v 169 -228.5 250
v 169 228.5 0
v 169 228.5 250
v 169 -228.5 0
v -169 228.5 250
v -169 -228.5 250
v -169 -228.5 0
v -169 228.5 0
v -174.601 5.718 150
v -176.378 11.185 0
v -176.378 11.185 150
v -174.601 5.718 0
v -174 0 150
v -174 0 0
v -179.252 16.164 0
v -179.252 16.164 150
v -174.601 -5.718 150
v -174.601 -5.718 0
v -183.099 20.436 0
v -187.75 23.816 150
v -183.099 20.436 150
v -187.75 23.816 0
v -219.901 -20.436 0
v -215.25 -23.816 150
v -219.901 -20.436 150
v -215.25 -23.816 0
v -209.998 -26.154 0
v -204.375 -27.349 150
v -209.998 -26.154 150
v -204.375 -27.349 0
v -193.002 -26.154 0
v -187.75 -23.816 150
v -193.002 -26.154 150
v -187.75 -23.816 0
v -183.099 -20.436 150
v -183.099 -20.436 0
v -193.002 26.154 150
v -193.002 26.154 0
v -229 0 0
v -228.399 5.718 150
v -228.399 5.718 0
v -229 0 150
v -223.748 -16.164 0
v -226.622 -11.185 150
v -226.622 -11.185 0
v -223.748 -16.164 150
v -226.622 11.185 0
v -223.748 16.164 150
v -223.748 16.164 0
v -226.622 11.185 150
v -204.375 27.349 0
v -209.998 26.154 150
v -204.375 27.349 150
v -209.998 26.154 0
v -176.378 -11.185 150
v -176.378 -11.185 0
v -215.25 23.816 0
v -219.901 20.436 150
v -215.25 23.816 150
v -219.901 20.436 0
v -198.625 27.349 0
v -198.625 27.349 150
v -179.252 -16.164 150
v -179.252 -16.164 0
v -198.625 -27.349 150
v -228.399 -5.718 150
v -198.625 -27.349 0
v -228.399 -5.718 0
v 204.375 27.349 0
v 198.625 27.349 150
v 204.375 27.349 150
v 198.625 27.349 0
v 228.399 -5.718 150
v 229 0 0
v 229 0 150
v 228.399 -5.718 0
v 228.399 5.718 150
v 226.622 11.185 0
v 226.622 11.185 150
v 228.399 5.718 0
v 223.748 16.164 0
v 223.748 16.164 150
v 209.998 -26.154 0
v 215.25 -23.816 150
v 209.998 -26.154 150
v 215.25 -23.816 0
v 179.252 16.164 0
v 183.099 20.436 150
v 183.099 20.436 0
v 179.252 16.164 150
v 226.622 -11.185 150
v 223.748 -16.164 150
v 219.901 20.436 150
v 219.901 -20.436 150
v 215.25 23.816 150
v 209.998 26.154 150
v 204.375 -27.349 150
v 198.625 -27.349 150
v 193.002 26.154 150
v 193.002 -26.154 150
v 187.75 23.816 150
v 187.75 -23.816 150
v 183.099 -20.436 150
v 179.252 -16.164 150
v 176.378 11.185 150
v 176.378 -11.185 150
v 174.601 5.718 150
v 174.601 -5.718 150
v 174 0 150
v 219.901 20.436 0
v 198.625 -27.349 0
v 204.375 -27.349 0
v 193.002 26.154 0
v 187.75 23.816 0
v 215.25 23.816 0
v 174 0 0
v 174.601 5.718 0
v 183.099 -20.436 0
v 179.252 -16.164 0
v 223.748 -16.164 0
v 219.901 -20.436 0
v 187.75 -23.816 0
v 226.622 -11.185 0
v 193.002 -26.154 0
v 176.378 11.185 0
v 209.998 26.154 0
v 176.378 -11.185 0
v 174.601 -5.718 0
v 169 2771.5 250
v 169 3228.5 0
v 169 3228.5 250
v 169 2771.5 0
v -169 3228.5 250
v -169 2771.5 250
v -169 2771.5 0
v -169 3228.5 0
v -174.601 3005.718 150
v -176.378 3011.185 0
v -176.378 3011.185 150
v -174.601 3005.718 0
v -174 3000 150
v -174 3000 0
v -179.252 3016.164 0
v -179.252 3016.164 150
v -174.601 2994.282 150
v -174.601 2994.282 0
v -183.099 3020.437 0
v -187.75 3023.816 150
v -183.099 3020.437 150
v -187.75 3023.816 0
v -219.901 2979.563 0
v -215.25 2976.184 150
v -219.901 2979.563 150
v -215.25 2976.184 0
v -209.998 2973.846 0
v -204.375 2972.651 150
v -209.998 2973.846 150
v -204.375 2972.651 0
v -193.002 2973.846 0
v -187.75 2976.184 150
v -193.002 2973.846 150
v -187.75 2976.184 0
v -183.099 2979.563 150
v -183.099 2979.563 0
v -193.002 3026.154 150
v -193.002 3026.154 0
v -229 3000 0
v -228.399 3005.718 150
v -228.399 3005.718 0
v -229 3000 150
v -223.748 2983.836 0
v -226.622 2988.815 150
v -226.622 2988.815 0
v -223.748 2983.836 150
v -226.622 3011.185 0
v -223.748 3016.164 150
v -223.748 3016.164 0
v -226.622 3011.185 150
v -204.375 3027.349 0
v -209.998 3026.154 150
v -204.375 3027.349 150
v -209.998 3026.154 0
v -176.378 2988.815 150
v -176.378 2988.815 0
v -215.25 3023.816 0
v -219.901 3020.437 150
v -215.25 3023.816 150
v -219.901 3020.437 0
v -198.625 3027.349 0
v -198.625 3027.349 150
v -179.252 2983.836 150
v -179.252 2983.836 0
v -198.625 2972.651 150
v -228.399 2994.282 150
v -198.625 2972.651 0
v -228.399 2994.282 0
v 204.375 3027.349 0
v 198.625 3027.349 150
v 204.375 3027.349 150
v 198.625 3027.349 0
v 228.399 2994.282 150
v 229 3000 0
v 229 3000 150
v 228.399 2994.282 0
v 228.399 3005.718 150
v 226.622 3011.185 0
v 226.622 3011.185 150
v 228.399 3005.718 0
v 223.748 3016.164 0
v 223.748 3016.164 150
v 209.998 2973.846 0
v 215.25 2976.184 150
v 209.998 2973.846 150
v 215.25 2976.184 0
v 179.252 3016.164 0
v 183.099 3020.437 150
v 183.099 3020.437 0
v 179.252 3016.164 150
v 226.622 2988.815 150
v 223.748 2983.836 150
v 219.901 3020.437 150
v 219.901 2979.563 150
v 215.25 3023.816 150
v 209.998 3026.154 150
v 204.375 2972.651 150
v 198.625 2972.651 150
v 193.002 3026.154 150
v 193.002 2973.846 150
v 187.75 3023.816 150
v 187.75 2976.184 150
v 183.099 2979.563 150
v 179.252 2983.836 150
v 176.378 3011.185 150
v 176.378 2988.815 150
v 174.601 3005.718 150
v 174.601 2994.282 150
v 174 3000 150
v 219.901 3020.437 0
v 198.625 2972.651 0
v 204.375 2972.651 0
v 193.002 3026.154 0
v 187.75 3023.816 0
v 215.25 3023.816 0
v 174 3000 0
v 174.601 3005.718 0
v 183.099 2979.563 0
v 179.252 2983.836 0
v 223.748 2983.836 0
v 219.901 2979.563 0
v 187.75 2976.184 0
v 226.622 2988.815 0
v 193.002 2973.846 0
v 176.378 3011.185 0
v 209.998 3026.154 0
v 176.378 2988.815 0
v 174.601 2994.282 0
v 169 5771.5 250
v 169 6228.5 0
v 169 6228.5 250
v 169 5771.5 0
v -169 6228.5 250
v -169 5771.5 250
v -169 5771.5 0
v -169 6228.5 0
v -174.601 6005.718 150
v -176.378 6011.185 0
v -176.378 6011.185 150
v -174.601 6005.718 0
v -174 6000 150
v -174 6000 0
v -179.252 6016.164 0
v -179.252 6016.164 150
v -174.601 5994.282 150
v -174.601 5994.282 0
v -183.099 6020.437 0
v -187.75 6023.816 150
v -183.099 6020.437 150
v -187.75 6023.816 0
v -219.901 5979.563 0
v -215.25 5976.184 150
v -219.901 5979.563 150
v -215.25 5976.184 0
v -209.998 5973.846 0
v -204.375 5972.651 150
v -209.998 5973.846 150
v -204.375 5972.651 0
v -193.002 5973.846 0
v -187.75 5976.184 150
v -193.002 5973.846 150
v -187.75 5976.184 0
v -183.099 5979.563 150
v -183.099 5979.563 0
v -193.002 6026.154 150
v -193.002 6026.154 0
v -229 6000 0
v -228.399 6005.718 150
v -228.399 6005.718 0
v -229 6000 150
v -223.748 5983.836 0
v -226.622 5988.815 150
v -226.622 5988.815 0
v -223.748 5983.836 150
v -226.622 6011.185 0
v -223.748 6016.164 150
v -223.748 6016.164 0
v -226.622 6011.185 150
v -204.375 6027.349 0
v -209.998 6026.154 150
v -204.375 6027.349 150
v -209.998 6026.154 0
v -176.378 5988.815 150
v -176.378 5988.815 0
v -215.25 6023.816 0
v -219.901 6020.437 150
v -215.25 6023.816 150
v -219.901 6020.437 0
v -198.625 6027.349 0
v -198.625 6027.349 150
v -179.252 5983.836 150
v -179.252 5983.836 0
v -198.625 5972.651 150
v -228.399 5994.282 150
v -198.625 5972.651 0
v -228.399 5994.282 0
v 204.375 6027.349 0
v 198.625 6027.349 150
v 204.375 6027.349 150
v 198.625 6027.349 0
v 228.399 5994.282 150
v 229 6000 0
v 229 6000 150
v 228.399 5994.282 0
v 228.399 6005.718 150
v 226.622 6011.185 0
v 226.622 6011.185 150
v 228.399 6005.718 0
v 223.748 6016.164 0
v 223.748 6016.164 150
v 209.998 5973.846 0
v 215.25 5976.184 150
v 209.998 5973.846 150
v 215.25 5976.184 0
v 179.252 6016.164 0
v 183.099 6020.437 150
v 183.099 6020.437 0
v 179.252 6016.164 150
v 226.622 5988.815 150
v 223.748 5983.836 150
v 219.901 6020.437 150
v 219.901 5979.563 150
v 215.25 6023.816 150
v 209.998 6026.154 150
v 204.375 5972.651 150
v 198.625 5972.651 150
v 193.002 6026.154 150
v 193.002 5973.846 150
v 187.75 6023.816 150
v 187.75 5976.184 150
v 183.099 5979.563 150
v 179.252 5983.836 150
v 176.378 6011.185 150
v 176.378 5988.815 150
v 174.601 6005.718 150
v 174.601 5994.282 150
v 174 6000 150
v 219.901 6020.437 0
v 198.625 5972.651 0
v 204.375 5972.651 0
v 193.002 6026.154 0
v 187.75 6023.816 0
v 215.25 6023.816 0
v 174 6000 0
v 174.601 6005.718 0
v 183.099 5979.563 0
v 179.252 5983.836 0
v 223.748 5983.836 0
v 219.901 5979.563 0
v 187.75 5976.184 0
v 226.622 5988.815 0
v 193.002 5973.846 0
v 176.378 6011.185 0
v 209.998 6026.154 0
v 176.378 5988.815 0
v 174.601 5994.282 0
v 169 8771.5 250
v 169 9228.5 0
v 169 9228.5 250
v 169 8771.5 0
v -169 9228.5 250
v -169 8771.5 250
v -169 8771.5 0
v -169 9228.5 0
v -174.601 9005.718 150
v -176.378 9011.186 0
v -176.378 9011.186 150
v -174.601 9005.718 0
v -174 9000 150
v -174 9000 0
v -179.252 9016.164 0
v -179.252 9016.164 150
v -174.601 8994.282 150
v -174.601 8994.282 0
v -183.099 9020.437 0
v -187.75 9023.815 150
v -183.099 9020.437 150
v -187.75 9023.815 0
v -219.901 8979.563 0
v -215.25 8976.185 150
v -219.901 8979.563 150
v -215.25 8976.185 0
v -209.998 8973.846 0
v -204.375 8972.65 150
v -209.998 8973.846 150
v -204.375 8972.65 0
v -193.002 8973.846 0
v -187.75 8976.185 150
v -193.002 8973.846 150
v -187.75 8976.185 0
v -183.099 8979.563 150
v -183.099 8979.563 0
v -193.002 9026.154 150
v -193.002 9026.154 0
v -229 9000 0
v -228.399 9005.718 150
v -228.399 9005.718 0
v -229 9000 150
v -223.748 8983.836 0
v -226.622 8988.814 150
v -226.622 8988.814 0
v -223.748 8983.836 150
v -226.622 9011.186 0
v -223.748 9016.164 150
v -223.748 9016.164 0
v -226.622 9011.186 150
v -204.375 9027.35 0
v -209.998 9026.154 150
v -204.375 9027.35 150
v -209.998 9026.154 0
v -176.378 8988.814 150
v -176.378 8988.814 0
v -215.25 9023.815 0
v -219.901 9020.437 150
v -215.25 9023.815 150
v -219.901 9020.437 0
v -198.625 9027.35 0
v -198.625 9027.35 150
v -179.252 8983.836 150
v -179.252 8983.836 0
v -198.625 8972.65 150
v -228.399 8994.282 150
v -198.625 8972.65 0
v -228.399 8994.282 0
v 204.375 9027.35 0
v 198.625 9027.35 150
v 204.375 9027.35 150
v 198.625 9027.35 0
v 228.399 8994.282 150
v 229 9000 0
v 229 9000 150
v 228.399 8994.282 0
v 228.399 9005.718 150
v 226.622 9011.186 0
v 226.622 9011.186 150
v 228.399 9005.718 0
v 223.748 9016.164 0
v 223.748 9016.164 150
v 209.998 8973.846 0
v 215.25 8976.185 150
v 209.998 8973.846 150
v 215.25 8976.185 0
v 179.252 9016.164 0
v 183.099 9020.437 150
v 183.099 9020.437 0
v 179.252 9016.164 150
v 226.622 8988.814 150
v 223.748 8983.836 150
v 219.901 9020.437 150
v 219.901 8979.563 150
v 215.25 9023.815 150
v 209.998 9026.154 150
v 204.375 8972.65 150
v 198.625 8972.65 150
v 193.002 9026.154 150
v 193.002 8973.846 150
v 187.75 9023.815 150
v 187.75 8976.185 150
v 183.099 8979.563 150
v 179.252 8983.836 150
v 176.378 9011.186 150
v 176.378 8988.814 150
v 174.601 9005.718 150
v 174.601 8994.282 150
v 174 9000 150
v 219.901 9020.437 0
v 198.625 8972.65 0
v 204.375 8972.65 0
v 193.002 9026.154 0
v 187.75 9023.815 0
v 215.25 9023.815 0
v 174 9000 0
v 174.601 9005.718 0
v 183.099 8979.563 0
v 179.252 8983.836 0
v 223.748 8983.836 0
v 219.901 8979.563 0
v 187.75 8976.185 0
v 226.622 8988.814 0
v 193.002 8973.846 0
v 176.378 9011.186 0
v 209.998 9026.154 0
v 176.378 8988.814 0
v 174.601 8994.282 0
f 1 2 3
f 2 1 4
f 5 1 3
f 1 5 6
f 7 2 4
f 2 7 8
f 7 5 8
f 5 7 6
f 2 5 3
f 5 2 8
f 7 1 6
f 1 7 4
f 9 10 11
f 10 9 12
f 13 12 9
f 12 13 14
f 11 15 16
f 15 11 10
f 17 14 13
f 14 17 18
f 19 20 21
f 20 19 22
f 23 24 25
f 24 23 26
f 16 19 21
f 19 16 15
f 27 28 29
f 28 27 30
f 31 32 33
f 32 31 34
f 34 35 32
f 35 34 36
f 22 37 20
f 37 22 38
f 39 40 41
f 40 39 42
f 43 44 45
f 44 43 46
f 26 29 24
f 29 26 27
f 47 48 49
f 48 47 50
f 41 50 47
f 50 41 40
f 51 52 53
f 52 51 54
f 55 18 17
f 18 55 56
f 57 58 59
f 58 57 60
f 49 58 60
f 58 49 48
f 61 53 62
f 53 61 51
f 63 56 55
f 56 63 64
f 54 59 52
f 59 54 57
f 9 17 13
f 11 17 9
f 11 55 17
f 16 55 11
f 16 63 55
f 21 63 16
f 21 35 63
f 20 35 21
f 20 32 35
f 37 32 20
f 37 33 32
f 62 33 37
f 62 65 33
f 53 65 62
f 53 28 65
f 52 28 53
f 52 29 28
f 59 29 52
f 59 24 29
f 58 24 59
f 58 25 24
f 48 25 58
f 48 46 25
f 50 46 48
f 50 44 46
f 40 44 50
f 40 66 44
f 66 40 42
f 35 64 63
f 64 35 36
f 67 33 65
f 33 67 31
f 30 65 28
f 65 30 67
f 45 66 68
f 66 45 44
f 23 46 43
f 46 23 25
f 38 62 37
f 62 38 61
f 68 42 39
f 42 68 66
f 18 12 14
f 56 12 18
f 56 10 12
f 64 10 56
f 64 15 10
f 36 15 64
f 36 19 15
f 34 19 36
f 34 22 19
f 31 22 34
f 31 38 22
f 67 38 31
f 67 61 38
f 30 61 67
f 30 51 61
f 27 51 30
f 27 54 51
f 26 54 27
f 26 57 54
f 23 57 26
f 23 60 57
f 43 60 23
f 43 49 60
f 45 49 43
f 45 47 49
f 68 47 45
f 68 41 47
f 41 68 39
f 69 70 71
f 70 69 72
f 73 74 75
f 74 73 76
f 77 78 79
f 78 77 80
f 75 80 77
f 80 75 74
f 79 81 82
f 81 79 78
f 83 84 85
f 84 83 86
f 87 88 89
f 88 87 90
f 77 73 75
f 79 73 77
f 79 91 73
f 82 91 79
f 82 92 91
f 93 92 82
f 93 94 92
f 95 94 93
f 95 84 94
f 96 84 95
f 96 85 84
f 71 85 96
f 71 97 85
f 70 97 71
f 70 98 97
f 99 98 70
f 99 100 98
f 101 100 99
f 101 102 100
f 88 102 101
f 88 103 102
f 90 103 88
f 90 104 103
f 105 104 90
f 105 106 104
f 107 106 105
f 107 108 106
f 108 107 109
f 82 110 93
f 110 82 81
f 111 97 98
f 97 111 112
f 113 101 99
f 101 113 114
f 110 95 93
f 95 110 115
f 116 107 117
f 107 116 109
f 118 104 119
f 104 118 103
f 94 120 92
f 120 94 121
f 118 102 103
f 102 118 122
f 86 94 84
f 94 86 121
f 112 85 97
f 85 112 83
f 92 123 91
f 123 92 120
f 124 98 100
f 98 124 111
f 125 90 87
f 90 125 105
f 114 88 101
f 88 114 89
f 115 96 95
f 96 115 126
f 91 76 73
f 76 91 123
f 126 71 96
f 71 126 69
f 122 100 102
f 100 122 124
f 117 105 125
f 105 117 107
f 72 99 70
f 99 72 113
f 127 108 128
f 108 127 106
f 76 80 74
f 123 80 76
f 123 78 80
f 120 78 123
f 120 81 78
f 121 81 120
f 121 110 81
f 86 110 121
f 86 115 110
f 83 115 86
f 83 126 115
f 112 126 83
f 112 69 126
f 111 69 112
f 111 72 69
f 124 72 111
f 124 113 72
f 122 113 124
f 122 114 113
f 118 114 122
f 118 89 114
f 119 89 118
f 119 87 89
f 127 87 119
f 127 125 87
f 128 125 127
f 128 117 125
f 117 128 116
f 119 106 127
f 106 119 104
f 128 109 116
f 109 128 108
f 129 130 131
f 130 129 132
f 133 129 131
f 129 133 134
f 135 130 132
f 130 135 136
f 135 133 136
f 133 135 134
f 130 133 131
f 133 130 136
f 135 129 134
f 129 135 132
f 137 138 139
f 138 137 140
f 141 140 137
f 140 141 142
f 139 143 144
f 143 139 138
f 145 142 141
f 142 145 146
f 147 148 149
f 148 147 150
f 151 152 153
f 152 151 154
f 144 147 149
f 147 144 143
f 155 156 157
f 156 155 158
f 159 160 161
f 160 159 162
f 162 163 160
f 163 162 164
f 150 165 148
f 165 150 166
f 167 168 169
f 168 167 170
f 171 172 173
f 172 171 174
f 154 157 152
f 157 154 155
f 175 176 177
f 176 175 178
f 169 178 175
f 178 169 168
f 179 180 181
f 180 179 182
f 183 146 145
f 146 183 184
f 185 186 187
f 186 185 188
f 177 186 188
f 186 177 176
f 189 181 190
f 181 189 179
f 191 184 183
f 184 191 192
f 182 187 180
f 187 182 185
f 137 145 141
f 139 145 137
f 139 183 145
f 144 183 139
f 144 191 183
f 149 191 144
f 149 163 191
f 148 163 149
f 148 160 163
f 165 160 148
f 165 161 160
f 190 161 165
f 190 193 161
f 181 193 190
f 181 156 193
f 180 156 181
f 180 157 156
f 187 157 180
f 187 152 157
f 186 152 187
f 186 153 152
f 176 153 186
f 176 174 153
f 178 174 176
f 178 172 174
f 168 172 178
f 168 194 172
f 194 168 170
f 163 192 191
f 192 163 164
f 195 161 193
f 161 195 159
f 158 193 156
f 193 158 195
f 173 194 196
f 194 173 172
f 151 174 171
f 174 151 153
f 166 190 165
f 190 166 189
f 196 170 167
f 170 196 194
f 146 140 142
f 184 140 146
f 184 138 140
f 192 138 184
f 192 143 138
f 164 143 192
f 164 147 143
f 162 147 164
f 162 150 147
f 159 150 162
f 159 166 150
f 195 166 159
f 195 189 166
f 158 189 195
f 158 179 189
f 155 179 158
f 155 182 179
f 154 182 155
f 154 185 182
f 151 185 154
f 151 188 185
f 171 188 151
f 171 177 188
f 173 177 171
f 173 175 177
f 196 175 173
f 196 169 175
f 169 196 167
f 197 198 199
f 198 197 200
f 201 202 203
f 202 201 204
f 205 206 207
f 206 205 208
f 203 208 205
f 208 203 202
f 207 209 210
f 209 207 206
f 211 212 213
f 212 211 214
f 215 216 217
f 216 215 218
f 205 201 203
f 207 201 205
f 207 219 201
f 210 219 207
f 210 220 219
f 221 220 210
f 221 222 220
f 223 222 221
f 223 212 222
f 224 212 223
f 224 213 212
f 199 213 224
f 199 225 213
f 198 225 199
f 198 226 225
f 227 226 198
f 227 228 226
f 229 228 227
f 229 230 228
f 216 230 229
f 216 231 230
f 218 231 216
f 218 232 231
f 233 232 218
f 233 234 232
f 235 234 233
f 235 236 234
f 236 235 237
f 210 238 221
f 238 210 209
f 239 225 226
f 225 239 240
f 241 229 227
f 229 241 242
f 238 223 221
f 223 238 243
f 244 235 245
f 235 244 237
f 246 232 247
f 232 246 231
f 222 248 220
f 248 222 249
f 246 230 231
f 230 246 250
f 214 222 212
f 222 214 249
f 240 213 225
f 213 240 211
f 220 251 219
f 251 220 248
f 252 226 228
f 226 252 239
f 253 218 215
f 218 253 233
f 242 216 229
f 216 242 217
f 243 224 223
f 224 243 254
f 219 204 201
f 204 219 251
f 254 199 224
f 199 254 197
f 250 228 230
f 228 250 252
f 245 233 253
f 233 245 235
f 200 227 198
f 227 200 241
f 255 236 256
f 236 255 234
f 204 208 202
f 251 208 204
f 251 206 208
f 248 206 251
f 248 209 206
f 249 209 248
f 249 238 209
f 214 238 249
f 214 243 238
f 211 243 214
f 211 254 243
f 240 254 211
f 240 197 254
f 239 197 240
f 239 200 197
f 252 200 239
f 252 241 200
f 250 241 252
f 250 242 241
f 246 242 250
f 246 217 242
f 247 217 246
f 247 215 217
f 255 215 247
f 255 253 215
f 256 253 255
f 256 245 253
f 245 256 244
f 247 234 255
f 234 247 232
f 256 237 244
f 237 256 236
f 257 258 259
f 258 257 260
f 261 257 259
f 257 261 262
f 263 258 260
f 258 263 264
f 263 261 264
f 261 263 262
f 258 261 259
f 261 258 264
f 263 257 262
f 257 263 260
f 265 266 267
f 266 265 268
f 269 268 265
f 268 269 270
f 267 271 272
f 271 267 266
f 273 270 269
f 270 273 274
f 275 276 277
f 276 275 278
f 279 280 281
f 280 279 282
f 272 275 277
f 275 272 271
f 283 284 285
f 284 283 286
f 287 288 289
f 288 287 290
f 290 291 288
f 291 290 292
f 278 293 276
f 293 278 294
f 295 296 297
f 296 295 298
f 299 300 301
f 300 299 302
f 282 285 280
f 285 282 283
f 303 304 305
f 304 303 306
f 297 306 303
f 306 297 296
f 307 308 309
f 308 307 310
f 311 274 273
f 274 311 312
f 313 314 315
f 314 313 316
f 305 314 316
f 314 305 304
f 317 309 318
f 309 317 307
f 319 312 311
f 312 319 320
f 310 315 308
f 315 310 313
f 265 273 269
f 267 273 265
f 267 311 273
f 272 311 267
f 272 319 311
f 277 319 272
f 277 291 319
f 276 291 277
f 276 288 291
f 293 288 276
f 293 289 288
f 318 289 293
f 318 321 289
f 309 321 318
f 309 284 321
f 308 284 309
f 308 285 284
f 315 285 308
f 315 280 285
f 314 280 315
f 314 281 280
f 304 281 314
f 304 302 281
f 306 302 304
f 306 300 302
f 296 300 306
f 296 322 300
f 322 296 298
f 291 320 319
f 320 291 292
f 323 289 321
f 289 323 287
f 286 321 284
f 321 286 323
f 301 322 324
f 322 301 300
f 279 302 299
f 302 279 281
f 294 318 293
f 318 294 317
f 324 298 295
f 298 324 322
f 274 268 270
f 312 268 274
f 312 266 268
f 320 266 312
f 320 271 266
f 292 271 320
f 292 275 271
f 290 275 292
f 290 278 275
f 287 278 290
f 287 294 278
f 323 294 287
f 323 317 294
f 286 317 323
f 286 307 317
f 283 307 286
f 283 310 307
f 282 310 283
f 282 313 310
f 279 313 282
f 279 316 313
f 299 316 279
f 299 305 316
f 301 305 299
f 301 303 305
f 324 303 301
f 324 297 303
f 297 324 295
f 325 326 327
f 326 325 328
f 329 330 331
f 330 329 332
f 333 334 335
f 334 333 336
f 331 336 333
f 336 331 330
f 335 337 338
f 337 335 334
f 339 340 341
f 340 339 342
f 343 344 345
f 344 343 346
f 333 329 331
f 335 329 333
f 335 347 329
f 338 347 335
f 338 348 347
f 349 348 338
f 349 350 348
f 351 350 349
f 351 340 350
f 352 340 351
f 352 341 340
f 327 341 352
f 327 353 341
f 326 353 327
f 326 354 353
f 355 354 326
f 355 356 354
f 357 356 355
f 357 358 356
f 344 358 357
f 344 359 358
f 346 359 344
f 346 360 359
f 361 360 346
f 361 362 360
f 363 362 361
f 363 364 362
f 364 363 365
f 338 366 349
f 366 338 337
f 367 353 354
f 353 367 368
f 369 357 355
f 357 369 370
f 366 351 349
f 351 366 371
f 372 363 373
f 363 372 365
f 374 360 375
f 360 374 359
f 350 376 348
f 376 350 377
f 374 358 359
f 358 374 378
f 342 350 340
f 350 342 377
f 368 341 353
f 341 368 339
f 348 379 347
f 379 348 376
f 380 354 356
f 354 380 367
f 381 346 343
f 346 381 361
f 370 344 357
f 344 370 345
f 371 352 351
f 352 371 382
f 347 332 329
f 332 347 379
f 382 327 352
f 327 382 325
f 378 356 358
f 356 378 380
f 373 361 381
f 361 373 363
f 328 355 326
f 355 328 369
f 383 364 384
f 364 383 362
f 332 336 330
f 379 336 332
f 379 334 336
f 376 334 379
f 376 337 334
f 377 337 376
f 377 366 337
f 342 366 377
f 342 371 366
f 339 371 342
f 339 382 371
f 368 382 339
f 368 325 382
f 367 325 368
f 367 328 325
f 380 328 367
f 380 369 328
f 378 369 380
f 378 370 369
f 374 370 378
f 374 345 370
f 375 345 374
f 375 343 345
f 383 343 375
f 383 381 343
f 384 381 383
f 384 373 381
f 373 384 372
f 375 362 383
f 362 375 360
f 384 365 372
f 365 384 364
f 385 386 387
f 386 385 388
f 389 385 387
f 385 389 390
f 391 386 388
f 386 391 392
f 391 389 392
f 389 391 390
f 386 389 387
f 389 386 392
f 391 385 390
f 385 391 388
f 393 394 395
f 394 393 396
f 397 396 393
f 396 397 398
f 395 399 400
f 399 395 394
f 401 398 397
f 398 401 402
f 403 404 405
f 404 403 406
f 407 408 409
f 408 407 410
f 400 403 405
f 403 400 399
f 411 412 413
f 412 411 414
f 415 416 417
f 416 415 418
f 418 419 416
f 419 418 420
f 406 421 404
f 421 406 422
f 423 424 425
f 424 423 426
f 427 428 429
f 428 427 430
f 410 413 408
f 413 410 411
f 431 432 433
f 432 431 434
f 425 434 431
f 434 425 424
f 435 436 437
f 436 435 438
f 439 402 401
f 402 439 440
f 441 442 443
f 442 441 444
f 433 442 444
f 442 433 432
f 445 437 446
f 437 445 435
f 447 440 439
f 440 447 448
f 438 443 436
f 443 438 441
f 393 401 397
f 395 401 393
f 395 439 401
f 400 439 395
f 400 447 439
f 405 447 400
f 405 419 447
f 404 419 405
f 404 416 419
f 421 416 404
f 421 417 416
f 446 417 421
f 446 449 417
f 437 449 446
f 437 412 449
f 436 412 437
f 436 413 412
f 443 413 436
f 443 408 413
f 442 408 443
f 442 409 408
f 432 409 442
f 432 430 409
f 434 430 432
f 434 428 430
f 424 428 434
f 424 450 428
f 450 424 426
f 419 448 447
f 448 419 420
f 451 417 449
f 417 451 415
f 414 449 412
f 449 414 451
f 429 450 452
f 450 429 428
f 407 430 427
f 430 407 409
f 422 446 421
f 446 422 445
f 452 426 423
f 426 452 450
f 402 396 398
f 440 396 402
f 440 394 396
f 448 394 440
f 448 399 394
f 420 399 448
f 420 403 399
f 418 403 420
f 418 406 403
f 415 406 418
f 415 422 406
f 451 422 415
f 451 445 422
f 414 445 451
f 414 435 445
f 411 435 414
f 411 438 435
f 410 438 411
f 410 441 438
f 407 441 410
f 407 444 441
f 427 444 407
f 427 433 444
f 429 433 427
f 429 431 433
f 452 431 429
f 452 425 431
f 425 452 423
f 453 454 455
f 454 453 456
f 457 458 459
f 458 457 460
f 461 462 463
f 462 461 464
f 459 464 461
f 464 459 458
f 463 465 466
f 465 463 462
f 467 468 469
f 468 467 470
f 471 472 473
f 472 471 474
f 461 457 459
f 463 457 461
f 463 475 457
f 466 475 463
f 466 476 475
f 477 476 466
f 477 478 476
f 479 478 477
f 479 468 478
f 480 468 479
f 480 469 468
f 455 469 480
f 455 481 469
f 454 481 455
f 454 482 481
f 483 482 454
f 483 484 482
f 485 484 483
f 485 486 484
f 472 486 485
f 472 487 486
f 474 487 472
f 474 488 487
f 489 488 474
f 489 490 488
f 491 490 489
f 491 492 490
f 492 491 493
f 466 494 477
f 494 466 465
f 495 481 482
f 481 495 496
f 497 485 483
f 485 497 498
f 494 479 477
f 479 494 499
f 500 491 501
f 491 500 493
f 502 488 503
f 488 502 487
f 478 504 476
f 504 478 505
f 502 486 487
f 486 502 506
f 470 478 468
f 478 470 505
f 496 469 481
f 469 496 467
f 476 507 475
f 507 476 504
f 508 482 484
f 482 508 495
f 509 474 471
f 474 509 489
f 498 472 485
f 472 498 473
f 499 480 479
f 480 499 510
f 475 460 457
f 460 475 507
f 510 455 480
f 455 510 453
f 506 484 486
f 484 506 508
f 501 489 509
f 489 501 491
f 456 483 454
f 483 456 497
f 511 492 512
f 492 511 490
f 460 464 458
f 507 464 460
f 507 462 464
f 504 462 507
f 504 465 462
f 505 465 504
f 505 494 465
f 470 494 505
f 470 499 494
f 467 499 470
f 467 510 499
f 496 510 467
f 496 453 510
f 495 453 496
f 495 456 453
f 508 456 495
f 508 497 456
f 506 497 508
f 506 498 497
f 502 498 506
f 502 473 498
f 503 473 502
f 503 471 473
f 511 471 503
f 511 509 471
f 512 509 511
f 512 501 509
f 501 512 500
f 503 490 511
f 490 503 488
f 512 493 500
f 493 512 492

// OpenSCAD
// Show how various cameras and lenses affect field of view

// Size of AUV
auv_size = [338, 457, 250];

// Down-facing camera tube radius
cam_r = 55;

// Height of bracket holding the camera
bracket_standoff = 5;

// Cameras are mounted on the outside of the AUV
half_baseline = auv_size.x / 2 + cam_r / 2 + bracket_standoff;
l_cam_pose = [- half_baseline, 0, 0];
r_cam_pose = [half_baseline, 0, 0];

// Draw the AUV
module auv() {
  color("#25cbf5", 0.4) translate([- auv_size.x / 2, - auv_size.y / 2, 0]) cube(auv_size);
}

// Draw a camera
module cam() {
  color("#f200ff", 0.4) cylinder(h = 150, r = cam_r / 2);
}

// Draw the field of view
module fov(horiz_fov, aspect_ratio, landscape, z) {
  x2 = tan(horiz_fov / 2) * z;
  y2 = tan(horiz_fov / 2) * z * (aspect_ratio == "4:3" ? 3 / 4 : 9 / 16);
  rotation = (landscape ? 0 : 90);
  points = [[0, 0, 0], [- x2, - y2, - z], [- x2, y2, - z], [x2, y2, - z], [x2, - y2, - z]];
  faces = [[0, 1, 2], [0, 2, 3], [0, 3, 4], [0, 4, 1], [1, 2, 3, 4]];
  color("grey", 0.3) rotate([0, 0, rotation]) polyhedron(points = points, faces = faces);
}

// Draw the AUV with the cameras and the overlapping fields of view
// The default projection distance is 1.5m
module assembly(horiz_fov = 62.2, aspect_ratio = "16:9", landscape = true, z = 1500) {
  auv();
  translate(l_cam_pose) cam();
  translate(r_cam_pose) cam();
  translate(l_cam_pose) fov(horiz_fov, aspect_ratio, landscape, z);
  translate(r_cam_pose) fov(horiz_fov, aspect_ratio, landscape, z);
}

// These are all Raspicam v2's:

// Standard lens
assembly(horiz_fov = 62);

translate([0, 3000, 0]) assembly(horiz_fov = 80);

translate([0, 6000, 0]) assembly(horiz_fov = 95);

// BlueRobotics wide angle lens
translate([0, 9000, 0]) assembly(horiz_fov = 110);
